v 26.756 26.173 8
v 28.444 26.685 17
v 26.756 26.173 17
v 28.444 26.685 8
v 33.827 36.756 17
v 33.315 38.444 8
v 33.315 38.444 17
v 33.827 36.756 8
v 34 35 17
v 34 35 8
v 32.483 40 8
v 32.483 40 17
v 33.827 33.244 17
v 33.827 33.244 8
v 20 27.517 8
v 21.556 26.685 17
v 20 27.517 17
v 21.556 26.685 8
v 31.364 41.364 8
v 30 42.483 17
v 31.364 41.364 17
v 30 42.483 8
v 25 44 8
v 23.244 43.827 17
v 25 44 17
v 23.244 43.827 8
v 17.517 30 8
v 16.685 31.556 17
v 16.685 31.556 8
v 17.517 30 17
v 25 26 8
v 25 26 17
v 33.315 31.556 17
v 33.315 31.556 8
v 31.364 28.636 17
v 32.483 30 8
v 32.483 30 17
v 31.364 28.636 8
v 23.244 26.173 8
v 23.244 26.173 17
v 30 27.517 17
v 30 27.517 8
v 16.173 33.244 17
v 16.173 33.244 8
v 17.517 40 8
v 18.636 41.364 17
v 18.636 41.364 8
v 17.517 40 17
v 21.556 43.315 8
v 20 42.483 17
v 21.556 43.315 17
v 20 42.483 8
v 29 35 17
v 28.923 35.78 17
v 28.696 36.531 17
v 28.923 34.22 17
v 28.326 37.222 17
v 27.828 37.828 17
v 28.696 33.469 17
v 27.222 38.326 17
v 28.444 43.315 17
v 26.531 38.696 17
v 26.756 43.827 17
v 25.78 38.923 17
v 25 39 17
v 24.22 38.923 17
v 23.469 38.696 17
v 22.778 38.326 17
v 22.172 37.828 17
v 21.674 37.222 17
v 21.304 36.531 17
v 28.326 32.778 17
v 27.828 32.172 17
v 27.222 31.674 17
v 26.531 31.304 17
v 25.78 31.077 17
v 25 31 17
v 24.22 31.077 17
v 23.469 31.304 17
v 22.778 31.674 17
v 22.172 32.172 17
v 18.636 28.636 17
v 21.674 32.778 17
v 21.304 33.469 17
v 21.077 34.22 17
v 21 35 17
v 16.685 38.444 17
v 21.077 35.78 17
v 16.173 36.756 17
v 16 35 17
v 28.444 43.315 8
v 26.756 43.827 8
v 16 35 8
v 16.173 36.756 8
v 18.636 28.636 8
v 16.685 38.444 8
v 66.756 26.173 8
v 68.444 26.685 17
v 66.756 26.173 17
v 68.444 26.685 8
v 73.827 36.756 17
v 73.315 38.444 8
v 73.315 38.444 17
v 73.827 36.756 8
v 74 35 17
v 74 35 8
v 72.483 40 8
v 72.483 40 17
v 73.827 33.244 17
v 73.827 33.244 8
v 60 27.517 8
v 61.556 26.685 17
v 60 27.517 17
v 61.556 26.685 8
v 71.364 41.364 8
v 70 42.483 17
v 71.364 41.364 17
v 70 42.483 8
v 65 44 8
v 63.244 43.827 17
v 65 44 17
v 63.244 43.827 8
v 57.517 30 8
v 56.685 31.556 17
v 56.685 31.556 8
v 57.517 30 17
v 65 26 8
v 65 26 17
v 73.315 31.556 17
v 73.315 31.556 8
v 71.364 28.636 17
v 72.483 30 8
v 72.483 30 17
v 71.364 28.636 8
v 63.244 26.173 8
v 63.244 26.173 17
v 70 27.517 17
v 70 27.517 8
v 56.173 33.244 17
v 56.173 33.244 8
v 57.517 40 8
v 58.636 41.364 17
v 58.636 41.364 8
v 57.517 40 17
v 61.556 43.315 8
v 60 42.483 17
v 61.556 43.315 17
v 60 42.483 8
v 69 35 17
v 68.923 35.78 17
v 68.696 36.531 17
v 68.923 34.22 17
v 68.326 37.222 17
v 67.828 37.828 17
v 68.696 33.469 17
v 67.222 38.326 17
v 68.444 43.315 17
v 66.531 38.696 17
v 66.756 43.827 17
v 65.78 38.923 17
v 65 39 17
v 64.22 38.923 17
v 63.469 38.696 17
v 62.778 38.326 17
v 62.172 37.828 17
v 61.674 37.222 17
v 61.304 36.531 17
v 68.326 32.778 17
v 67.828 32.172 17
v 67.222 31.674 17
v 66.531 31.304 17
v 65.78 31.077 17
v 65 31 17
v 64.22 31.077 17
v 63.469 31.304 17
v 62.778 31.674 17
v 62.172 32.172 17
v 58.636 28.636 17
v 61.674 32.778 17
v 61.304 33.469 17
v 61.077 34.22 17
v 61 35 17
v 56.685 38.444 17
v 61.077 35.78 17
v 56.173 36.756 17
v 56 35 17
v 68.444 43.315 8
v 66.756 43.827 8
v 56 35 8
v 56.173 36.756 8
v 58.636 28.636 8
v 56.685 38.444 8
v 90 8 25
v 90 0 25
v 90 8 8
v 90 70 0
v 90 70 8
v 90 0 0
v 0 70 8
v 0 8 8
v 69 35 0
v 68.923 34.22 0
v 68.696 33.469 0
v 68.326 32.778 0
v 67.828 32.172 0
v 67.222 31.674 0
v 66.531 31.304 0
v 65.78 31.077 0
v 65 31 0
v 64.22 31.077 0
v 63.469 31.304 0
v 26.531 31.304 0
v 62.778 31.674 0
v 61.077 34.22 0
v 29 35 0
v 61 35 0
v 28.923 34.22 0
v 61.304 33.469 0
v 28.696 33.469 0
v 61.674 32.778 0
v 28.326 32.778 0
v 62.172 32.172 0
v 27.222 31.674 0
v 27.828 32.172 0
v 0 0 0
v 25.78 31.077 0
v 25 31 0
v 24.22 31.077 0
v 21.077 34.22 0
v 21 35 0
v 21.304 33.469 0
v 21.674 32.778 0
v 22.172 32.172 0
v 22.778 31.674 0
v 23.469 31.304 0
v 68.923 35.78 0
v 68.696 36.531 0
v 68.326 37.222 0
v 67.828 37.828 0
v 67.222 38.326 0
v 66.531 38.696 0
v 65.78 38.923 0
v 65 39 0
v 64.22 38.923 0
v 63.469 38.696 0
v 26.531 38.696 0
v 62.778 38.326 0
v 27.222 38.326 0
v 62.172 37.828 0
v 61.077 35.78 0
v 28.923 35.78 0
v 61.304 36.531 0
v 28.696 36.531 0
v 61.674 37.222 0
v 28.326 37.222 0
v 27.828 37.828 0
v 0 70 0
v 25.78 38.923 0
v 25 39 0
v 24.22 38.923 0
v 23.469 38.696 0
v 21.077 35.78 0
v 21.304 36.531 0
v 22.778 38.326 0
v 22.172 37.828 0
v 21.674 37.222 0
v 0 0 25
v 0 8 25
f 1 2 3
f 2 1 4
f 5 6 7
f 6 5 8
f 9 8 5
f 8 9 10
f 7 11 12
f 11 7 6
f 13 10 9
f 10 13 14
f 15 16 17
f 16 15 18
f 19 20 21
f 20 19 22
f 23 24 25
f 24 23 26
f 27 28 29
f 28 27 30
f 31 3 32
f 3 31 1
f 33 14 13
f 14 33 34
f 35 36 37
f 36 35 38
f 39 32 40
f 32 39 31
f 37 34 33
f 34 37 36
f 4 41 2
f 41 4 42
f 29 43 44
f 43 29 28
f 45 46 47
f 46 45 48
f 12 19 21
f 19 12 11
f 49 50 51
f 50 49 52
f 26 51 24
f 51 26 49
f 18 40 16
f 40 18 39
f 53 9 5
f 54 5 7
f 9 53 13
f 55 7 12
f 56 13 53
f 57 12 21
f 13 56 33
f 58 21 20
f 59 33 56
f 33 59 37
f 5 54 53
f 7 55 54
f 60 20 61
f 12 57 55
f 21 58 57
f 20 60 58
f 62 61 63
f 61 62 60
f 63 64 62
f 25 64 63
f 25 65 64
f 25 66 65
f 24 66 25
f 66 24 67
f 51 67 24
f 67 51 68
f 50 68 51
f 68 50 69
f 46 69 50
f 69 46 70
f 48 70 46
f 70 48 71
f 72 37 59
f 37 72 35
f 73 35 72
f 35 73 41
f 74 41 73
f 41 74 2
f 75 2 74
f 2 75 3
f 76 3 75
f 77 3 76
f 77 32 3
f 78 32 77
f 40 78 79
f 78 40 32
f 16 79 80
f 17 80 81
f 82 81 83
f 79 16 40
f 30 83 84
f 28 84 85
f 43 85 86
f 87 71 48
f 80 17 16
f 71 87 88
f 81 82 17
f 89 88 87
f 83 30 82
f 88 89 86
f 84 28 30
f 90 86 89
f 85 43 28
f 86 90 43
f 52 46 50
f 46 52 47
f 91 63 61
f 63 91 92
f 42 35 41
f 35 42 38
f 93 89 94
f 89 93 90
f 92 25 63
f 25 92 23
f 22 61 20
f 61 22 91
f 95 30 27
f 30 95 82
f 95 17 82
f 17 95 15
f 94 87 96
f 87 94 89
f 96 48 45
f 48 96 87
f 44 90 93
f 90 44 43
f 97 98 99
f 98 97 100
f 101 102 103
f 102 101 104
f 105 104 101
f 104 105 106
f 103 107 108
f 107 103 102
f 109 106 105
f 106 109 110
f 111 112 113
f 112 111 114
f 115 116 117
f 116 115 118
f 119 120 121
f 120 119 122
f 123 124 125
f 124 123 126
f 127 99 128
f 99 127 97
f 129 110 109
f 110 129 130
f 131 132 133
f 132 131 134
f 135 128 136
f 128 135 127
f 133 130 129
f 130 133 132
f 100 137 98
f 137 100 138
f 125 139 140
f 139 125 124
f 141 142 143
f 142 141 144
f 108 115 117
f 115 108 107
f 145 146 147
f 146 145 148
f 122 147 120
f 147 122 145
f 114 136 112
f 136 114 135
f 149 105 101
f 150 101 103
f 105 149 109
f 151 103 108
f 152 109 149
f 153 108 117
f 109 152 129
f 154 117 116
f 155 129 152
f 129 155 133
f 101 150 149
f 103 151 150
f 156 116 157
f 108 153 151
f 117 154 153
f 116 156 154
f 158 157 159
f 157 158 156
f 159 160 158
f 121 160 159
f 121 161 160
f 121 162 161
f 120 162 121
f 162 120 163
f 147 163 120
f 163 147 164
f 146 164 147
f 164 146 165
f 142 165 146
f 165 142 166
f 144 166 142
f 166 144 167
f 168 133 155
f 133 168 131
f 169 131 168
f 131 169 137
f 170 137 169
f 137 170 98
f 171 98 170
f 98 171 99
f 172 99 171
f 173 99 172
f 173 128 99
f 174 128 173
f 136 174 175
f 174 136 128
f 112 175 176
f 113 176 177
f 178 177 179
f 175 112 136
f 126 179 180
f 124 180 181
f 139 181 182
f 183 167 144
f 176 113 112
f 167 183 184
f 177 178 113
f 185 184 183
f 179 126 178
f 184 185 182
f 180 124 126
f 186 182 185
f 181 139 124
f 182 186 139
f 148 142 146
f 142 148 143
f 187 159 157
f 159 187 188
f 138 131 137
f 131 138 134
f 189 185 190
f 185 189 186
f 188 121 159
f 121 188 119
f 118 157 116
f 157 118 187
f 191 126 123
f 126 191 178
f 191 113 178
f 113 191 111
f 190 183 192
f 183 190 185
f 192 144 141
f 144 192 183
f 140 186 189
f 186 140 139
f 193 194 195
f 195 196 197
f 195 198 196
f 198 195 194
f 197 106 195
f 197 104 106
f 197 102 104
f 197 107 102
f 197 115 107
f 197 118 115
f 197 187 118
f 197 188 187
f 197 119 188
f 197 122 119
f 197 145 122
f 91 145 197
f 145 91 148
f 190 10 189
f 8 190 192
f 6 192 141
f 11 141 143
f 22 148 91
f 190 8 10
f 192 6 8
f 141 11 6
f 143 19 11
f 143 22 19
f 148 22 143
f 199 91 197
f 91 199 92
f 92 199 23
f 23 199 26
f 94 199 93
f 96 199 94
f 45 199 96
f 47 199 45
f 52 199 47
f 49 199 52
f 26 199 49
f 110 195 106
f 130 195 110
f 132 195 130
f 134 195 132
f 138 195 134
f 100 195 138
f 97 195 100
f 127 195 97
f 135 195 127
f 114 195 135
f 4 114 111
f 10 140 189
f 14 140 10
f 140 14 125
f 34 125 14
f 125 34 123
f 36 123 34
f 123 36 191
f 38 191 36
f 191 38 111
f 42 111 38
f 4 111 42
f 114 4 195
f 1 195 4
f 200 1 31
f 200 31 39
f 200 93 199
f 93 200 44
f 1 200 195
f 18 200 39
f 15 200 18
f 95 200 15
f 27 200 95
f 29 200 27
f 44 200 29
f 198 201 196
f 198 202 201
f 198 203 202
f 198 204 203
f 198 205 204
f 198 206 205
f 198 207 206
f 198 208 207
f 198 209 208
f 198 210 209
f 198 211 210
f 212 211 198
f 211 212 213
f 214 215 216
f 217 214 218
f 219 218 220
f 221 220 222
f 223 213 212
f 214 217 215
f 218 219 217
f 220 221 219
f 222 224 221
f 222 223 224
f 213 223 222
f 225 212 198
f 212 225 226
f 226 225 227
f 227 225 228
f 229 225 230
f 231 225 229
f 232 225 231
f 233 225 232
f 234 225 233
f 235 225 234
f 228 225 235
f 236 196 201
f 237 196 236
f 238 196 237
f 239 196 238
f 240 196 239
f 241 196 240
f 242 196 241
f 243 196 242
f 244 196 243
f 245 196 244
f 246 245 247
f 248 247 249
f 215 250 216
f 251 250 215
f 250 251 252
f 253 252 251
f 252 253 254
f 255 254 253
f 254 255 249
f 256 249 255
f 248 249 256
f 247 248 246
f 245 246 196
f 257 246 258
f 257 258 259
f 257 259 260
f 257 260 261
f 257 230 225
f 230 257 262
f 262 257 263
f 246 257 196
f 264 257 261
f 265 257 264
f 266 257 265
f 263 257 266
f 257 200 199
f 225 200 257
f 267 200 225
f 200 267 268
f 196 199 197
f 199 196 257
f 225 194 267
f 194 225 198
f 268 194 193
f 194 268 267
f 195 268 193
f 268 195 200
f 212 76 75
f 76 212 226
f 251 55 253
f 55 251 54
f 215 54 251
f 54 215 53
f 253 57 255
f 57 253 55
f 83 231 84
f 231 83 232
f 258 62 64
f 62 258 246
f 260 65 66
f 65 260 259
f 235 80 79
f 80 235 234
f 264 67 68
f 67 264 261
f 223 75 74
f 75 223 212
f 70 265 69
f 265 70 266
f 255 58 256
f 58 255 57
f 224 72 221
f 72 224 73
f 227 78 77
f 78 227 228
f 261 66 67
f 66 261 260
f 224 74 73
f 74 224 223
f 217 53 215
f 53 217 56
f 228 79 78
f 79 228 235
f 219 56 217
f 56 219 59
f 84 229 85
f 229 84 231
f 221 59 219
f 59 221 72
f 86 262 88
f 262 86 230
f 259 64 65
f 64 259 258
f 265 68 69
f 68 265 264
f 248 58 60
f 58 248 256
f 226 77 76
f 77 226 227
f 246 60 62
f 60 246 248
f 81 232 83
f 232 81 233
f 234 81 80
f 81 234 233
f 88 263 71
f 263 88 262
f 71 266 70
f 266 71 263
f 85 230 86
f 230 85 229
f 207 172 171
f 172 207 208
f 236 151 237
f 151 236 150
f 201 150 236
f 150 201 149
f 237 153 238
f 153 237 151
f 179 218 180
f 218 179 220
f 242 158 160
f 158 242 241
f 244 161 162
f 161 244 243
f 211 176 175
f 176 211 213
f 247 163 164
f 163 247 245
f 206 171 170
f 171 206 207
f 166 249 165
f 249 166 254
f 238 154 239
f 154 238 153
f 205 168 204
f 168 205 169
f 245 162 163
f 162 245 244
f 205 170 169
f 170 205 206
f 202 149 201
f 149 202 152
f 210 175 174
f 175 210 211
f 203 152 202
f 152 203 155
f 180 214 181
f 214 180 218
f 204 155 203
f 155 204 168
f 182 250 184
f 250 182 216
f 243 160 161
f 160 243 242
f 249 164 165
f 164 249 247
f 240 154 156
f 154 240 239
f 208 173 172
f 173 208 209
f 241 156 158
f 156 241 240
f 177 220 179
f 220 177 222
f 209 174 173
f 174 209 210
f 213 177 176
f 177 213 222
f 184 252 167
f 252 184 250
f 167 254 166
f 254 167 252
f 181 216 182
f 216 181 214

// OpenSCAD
$fn = 32;

// ----------------------------------------------------------------------
// Drill jig: fence jig
// ----------------------------------------------------------------------

// --- parameters (mm) ---
plate_l = 90;             // plate length, X
plate_w = 70;             // plate width, Y
plate_t = 8;              // plate thickness
boss_d = 18;              // guide boss diameter
boss_h = 10;              // boss height above the plate
guide_d = 8;              // guide hole diameter
boss_pitch = 40;          // boss pitch
fence_h = 18;             // fence height above the plate
fence_t = 8;              // fence thickness

n_boss = 2;  // guide bosses
boss_x0 = (plate_l - (n_boss - 1) * boss_pitch) / 2;  // first boss X
boss_top = plate_t - 1 + boss_h;  // boss crown height
fence_top = plate_t - 1 + fence_h;  // fence crown height
total_h = max([fence_top, boss_top]);  // overall height

difference() {
  union() {
  cube([plate_l, plate_w, plate_t]);
  for (i = [0 : n_boss - 1])
    translate([boss_x0 + i * boss_pitch, plate_w / 2, plate_t - 1])
      cylinder(h = boss_h, d = boss_d);
  translate([0, 0, plate_t - 1]) cube([plate_l, fence_t, fence_h]);
  }
  for (i = [0 : n_boss - 1])
    translate([boss_x0 + i * boss_pitch, plate_w / 2, -1])
      cylinder(h = plate_t + boss_h, d = guide_d);
}
